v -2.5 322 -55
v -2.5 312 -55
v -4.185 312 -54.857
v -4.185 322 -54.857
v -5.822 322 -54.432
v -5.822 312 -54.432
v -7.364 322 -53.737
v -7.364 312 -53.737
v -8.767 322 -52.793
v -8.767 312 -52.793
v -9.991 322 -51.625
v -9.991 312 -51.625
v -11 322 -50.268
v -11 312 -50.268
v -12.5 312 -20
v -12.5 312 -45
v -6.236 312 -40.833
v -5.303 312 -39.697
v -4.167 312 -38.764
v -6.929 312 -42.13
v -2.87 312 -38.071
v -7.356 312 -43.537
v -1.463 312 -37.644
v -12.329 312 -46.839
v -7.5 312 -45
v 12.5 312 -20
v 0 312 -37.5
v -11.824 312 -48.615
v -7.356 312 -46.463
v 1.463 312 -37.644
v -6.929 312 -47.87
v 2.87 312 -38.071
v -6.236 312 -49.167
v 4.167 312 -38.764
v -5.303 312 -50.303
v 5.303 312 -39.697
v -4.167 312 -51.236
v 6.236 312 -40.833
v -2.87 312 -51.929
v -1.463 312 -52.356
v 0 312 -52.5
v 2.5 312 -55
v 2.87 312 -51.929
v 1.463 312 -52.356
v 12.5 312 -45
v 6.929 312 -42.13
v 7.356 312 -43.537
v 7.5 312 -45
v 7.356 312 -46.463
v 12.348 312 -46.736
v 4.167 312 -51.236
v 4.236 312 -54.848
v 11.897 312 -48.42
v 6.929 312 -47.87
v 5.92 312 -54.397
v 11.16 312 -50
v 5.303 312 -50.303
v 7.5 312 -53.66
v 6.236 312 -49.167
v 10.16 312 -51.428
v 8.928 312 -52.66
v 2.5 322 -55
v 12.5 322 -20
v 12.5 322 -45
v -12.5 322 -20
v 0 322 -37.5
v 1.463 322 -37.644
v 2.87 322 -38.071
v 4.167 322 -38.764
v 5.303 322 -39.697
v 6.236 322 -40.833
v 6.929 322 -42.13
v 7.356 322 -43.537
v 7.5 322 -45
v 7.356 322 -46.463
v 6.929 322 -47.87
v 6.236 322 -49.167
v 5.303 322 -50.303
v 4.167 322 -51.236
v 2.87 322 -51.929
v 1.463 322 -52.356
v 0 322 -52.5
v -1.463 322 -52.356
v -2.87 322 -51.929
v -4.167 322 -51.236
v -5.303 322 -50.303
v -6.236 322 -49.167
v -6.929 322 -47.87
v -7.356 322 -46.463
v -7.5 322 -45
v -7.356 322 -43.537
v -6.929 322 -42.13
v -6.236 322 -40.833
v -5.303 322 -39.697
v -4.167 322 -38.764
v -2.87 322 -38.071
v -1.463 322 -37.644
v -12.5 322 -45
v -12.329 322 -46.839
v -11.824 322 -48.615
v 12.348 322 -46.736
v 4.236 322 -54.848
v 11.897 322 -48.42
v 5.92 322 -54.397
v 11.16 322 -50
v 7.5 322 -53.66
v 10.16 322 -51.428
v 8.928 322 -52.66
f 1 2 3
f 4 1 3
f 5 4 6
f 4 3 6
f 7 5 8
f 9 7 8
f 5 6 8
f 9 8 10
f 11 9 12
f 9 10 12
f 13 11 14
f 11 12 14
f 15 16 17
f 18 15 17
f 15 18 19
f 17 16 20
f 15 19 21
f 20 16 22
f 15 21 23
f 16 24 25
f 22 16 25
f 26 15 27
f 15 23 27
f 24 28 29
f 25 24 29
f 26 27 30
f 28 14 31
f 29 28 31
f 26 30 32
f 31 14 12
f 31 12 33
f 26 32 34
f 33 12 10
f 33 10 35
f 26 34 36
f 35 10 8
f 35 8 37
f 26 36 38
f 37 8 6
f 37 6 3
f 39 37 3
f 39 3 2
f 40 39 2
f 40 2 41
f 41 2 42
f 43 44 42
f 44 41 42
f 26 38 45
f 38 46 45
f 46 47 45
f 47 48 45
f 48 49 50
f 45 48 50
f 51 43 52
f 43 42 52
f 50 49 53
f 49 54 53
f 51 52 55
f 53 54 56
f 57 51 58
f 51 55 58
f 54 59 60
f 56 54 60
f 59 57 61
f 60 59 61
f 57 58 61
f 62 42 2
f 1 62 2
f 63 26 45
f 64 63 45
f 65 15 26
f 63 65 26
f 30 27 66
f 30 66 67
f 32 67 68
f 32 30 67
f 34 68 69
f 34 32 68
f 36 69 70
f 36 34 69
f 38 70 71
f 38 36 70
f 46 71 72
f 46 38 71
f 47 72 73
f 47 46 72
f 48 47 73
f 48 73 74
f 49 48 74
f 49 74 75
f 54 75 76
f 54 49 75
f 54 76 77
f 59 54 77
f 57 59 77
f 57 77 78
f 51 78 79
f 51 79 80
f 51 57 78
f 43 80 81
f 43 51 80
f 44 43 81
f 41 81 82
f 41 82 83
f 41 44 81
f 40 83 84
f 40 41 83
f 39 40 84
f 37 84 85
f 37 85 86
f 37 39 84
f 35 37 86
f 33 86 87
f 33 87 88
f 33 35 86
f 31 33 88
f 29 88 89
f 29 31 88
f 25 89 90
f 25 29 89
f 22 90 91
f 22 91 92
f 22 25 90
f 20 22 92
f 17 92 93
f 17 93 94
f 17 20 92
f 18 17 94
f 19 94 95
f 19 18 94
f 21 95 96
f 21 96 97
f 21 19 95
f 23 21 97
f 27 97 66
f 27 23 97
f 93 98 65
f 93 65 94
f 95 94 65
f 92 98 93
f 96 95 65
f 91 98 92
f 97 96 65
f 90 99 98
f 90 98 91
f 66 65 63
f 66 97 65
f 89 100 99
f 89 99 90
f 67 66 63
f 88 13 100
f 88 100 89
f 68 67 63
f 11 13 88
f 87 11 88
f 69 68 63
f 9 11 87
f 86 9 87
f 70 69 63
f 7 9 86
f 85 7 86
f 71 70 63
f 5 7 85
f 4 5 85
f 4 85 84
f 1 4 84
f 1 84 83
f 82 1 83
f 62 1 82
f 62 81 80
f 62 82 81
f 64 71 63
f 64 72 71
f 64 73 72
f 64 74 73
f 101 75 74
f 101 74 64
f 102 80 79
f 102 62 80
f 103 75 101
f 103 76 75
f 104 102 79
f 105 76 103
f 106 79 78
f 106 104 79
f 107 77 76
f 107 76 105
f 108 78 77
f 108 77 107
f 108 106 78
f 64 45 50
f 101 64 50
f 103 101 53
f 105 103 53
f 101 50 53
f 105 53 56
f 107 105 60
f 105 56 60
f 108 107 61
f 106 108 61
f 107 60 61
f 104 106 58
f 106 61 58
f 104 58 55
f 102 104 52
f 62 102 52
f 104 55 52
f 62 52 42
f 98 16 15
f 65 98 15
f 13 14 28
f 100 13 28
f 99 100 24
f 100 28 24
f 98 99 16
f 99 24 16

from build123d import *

# Parameters (mm, degrees)
STOCK_VARAV_UKSEGA_1_START = 312
STOCK_VARAV_UKSEGA_1_DEPTH = 10
TAB1_START                 = -10
SKETCH1_R                  = 7.5
TAB1_DEPTH                 = 10


# Read off the part's stored shape, not the designer's step: Stock-Varav_uksega-1
# Sheet-metal steps are written as plain solids
with BuildPart() as part:
    # Stock-Varav_uksega-1 outline → Stock-Varav_uksega-1 (new body)
    with BuildSketch(Plane(origin=(0, 0, 0), x_dir=(1, 0, 0), z_dir=(0, 1, 0)).offset(STOCK_VARAV_UKSEGA_1_START)):
        with BuildLine():
            Line((-11, 20), (-11, 50.267826876))
            ThreePointArc((-11, 50.267826876), (-12.117692031, 47.738612787), (-12.5, 45))
            Line((-12.5, 45), (-12.5, 20))
            Line((-12.5, 20), (-11, 20))
        make_face()
    extrude(amount=STOCK_VARAV_UKSEGA_1_DEPTH)

    # Sketch1 → Tab1 (add)
    with BuildSketch(Plane(origin=(0, 322, 0), x_dir=(1, 0, 0), z_dir=(0, 1, 0)).offset(TAB1_START)):
        with BuildLine():
            Line((-12.5, 20), (12.5, 20))
            Line((12.5, 20), (12.5, 45))
            ThreePointArc((12.5, 45), (9.571067812, 52.071067812), (2.5, 55))
            Line((2.5, 55), (-2.5, 55))
            ThreePointArc((-2.5, 55), (-9.571067812, 52.071067812), (-12.5, 45))
            Line((-12.5, 45), (-12.5, 20))
        make_face()
        with Locations(Location((0, 45, 0), (0, 0, 270))):
            Circle(SKETCH1_R, mode=Mode.SUBTRACT)
    extrude(amount=TAB1_DEPTH)


solid = part.part
